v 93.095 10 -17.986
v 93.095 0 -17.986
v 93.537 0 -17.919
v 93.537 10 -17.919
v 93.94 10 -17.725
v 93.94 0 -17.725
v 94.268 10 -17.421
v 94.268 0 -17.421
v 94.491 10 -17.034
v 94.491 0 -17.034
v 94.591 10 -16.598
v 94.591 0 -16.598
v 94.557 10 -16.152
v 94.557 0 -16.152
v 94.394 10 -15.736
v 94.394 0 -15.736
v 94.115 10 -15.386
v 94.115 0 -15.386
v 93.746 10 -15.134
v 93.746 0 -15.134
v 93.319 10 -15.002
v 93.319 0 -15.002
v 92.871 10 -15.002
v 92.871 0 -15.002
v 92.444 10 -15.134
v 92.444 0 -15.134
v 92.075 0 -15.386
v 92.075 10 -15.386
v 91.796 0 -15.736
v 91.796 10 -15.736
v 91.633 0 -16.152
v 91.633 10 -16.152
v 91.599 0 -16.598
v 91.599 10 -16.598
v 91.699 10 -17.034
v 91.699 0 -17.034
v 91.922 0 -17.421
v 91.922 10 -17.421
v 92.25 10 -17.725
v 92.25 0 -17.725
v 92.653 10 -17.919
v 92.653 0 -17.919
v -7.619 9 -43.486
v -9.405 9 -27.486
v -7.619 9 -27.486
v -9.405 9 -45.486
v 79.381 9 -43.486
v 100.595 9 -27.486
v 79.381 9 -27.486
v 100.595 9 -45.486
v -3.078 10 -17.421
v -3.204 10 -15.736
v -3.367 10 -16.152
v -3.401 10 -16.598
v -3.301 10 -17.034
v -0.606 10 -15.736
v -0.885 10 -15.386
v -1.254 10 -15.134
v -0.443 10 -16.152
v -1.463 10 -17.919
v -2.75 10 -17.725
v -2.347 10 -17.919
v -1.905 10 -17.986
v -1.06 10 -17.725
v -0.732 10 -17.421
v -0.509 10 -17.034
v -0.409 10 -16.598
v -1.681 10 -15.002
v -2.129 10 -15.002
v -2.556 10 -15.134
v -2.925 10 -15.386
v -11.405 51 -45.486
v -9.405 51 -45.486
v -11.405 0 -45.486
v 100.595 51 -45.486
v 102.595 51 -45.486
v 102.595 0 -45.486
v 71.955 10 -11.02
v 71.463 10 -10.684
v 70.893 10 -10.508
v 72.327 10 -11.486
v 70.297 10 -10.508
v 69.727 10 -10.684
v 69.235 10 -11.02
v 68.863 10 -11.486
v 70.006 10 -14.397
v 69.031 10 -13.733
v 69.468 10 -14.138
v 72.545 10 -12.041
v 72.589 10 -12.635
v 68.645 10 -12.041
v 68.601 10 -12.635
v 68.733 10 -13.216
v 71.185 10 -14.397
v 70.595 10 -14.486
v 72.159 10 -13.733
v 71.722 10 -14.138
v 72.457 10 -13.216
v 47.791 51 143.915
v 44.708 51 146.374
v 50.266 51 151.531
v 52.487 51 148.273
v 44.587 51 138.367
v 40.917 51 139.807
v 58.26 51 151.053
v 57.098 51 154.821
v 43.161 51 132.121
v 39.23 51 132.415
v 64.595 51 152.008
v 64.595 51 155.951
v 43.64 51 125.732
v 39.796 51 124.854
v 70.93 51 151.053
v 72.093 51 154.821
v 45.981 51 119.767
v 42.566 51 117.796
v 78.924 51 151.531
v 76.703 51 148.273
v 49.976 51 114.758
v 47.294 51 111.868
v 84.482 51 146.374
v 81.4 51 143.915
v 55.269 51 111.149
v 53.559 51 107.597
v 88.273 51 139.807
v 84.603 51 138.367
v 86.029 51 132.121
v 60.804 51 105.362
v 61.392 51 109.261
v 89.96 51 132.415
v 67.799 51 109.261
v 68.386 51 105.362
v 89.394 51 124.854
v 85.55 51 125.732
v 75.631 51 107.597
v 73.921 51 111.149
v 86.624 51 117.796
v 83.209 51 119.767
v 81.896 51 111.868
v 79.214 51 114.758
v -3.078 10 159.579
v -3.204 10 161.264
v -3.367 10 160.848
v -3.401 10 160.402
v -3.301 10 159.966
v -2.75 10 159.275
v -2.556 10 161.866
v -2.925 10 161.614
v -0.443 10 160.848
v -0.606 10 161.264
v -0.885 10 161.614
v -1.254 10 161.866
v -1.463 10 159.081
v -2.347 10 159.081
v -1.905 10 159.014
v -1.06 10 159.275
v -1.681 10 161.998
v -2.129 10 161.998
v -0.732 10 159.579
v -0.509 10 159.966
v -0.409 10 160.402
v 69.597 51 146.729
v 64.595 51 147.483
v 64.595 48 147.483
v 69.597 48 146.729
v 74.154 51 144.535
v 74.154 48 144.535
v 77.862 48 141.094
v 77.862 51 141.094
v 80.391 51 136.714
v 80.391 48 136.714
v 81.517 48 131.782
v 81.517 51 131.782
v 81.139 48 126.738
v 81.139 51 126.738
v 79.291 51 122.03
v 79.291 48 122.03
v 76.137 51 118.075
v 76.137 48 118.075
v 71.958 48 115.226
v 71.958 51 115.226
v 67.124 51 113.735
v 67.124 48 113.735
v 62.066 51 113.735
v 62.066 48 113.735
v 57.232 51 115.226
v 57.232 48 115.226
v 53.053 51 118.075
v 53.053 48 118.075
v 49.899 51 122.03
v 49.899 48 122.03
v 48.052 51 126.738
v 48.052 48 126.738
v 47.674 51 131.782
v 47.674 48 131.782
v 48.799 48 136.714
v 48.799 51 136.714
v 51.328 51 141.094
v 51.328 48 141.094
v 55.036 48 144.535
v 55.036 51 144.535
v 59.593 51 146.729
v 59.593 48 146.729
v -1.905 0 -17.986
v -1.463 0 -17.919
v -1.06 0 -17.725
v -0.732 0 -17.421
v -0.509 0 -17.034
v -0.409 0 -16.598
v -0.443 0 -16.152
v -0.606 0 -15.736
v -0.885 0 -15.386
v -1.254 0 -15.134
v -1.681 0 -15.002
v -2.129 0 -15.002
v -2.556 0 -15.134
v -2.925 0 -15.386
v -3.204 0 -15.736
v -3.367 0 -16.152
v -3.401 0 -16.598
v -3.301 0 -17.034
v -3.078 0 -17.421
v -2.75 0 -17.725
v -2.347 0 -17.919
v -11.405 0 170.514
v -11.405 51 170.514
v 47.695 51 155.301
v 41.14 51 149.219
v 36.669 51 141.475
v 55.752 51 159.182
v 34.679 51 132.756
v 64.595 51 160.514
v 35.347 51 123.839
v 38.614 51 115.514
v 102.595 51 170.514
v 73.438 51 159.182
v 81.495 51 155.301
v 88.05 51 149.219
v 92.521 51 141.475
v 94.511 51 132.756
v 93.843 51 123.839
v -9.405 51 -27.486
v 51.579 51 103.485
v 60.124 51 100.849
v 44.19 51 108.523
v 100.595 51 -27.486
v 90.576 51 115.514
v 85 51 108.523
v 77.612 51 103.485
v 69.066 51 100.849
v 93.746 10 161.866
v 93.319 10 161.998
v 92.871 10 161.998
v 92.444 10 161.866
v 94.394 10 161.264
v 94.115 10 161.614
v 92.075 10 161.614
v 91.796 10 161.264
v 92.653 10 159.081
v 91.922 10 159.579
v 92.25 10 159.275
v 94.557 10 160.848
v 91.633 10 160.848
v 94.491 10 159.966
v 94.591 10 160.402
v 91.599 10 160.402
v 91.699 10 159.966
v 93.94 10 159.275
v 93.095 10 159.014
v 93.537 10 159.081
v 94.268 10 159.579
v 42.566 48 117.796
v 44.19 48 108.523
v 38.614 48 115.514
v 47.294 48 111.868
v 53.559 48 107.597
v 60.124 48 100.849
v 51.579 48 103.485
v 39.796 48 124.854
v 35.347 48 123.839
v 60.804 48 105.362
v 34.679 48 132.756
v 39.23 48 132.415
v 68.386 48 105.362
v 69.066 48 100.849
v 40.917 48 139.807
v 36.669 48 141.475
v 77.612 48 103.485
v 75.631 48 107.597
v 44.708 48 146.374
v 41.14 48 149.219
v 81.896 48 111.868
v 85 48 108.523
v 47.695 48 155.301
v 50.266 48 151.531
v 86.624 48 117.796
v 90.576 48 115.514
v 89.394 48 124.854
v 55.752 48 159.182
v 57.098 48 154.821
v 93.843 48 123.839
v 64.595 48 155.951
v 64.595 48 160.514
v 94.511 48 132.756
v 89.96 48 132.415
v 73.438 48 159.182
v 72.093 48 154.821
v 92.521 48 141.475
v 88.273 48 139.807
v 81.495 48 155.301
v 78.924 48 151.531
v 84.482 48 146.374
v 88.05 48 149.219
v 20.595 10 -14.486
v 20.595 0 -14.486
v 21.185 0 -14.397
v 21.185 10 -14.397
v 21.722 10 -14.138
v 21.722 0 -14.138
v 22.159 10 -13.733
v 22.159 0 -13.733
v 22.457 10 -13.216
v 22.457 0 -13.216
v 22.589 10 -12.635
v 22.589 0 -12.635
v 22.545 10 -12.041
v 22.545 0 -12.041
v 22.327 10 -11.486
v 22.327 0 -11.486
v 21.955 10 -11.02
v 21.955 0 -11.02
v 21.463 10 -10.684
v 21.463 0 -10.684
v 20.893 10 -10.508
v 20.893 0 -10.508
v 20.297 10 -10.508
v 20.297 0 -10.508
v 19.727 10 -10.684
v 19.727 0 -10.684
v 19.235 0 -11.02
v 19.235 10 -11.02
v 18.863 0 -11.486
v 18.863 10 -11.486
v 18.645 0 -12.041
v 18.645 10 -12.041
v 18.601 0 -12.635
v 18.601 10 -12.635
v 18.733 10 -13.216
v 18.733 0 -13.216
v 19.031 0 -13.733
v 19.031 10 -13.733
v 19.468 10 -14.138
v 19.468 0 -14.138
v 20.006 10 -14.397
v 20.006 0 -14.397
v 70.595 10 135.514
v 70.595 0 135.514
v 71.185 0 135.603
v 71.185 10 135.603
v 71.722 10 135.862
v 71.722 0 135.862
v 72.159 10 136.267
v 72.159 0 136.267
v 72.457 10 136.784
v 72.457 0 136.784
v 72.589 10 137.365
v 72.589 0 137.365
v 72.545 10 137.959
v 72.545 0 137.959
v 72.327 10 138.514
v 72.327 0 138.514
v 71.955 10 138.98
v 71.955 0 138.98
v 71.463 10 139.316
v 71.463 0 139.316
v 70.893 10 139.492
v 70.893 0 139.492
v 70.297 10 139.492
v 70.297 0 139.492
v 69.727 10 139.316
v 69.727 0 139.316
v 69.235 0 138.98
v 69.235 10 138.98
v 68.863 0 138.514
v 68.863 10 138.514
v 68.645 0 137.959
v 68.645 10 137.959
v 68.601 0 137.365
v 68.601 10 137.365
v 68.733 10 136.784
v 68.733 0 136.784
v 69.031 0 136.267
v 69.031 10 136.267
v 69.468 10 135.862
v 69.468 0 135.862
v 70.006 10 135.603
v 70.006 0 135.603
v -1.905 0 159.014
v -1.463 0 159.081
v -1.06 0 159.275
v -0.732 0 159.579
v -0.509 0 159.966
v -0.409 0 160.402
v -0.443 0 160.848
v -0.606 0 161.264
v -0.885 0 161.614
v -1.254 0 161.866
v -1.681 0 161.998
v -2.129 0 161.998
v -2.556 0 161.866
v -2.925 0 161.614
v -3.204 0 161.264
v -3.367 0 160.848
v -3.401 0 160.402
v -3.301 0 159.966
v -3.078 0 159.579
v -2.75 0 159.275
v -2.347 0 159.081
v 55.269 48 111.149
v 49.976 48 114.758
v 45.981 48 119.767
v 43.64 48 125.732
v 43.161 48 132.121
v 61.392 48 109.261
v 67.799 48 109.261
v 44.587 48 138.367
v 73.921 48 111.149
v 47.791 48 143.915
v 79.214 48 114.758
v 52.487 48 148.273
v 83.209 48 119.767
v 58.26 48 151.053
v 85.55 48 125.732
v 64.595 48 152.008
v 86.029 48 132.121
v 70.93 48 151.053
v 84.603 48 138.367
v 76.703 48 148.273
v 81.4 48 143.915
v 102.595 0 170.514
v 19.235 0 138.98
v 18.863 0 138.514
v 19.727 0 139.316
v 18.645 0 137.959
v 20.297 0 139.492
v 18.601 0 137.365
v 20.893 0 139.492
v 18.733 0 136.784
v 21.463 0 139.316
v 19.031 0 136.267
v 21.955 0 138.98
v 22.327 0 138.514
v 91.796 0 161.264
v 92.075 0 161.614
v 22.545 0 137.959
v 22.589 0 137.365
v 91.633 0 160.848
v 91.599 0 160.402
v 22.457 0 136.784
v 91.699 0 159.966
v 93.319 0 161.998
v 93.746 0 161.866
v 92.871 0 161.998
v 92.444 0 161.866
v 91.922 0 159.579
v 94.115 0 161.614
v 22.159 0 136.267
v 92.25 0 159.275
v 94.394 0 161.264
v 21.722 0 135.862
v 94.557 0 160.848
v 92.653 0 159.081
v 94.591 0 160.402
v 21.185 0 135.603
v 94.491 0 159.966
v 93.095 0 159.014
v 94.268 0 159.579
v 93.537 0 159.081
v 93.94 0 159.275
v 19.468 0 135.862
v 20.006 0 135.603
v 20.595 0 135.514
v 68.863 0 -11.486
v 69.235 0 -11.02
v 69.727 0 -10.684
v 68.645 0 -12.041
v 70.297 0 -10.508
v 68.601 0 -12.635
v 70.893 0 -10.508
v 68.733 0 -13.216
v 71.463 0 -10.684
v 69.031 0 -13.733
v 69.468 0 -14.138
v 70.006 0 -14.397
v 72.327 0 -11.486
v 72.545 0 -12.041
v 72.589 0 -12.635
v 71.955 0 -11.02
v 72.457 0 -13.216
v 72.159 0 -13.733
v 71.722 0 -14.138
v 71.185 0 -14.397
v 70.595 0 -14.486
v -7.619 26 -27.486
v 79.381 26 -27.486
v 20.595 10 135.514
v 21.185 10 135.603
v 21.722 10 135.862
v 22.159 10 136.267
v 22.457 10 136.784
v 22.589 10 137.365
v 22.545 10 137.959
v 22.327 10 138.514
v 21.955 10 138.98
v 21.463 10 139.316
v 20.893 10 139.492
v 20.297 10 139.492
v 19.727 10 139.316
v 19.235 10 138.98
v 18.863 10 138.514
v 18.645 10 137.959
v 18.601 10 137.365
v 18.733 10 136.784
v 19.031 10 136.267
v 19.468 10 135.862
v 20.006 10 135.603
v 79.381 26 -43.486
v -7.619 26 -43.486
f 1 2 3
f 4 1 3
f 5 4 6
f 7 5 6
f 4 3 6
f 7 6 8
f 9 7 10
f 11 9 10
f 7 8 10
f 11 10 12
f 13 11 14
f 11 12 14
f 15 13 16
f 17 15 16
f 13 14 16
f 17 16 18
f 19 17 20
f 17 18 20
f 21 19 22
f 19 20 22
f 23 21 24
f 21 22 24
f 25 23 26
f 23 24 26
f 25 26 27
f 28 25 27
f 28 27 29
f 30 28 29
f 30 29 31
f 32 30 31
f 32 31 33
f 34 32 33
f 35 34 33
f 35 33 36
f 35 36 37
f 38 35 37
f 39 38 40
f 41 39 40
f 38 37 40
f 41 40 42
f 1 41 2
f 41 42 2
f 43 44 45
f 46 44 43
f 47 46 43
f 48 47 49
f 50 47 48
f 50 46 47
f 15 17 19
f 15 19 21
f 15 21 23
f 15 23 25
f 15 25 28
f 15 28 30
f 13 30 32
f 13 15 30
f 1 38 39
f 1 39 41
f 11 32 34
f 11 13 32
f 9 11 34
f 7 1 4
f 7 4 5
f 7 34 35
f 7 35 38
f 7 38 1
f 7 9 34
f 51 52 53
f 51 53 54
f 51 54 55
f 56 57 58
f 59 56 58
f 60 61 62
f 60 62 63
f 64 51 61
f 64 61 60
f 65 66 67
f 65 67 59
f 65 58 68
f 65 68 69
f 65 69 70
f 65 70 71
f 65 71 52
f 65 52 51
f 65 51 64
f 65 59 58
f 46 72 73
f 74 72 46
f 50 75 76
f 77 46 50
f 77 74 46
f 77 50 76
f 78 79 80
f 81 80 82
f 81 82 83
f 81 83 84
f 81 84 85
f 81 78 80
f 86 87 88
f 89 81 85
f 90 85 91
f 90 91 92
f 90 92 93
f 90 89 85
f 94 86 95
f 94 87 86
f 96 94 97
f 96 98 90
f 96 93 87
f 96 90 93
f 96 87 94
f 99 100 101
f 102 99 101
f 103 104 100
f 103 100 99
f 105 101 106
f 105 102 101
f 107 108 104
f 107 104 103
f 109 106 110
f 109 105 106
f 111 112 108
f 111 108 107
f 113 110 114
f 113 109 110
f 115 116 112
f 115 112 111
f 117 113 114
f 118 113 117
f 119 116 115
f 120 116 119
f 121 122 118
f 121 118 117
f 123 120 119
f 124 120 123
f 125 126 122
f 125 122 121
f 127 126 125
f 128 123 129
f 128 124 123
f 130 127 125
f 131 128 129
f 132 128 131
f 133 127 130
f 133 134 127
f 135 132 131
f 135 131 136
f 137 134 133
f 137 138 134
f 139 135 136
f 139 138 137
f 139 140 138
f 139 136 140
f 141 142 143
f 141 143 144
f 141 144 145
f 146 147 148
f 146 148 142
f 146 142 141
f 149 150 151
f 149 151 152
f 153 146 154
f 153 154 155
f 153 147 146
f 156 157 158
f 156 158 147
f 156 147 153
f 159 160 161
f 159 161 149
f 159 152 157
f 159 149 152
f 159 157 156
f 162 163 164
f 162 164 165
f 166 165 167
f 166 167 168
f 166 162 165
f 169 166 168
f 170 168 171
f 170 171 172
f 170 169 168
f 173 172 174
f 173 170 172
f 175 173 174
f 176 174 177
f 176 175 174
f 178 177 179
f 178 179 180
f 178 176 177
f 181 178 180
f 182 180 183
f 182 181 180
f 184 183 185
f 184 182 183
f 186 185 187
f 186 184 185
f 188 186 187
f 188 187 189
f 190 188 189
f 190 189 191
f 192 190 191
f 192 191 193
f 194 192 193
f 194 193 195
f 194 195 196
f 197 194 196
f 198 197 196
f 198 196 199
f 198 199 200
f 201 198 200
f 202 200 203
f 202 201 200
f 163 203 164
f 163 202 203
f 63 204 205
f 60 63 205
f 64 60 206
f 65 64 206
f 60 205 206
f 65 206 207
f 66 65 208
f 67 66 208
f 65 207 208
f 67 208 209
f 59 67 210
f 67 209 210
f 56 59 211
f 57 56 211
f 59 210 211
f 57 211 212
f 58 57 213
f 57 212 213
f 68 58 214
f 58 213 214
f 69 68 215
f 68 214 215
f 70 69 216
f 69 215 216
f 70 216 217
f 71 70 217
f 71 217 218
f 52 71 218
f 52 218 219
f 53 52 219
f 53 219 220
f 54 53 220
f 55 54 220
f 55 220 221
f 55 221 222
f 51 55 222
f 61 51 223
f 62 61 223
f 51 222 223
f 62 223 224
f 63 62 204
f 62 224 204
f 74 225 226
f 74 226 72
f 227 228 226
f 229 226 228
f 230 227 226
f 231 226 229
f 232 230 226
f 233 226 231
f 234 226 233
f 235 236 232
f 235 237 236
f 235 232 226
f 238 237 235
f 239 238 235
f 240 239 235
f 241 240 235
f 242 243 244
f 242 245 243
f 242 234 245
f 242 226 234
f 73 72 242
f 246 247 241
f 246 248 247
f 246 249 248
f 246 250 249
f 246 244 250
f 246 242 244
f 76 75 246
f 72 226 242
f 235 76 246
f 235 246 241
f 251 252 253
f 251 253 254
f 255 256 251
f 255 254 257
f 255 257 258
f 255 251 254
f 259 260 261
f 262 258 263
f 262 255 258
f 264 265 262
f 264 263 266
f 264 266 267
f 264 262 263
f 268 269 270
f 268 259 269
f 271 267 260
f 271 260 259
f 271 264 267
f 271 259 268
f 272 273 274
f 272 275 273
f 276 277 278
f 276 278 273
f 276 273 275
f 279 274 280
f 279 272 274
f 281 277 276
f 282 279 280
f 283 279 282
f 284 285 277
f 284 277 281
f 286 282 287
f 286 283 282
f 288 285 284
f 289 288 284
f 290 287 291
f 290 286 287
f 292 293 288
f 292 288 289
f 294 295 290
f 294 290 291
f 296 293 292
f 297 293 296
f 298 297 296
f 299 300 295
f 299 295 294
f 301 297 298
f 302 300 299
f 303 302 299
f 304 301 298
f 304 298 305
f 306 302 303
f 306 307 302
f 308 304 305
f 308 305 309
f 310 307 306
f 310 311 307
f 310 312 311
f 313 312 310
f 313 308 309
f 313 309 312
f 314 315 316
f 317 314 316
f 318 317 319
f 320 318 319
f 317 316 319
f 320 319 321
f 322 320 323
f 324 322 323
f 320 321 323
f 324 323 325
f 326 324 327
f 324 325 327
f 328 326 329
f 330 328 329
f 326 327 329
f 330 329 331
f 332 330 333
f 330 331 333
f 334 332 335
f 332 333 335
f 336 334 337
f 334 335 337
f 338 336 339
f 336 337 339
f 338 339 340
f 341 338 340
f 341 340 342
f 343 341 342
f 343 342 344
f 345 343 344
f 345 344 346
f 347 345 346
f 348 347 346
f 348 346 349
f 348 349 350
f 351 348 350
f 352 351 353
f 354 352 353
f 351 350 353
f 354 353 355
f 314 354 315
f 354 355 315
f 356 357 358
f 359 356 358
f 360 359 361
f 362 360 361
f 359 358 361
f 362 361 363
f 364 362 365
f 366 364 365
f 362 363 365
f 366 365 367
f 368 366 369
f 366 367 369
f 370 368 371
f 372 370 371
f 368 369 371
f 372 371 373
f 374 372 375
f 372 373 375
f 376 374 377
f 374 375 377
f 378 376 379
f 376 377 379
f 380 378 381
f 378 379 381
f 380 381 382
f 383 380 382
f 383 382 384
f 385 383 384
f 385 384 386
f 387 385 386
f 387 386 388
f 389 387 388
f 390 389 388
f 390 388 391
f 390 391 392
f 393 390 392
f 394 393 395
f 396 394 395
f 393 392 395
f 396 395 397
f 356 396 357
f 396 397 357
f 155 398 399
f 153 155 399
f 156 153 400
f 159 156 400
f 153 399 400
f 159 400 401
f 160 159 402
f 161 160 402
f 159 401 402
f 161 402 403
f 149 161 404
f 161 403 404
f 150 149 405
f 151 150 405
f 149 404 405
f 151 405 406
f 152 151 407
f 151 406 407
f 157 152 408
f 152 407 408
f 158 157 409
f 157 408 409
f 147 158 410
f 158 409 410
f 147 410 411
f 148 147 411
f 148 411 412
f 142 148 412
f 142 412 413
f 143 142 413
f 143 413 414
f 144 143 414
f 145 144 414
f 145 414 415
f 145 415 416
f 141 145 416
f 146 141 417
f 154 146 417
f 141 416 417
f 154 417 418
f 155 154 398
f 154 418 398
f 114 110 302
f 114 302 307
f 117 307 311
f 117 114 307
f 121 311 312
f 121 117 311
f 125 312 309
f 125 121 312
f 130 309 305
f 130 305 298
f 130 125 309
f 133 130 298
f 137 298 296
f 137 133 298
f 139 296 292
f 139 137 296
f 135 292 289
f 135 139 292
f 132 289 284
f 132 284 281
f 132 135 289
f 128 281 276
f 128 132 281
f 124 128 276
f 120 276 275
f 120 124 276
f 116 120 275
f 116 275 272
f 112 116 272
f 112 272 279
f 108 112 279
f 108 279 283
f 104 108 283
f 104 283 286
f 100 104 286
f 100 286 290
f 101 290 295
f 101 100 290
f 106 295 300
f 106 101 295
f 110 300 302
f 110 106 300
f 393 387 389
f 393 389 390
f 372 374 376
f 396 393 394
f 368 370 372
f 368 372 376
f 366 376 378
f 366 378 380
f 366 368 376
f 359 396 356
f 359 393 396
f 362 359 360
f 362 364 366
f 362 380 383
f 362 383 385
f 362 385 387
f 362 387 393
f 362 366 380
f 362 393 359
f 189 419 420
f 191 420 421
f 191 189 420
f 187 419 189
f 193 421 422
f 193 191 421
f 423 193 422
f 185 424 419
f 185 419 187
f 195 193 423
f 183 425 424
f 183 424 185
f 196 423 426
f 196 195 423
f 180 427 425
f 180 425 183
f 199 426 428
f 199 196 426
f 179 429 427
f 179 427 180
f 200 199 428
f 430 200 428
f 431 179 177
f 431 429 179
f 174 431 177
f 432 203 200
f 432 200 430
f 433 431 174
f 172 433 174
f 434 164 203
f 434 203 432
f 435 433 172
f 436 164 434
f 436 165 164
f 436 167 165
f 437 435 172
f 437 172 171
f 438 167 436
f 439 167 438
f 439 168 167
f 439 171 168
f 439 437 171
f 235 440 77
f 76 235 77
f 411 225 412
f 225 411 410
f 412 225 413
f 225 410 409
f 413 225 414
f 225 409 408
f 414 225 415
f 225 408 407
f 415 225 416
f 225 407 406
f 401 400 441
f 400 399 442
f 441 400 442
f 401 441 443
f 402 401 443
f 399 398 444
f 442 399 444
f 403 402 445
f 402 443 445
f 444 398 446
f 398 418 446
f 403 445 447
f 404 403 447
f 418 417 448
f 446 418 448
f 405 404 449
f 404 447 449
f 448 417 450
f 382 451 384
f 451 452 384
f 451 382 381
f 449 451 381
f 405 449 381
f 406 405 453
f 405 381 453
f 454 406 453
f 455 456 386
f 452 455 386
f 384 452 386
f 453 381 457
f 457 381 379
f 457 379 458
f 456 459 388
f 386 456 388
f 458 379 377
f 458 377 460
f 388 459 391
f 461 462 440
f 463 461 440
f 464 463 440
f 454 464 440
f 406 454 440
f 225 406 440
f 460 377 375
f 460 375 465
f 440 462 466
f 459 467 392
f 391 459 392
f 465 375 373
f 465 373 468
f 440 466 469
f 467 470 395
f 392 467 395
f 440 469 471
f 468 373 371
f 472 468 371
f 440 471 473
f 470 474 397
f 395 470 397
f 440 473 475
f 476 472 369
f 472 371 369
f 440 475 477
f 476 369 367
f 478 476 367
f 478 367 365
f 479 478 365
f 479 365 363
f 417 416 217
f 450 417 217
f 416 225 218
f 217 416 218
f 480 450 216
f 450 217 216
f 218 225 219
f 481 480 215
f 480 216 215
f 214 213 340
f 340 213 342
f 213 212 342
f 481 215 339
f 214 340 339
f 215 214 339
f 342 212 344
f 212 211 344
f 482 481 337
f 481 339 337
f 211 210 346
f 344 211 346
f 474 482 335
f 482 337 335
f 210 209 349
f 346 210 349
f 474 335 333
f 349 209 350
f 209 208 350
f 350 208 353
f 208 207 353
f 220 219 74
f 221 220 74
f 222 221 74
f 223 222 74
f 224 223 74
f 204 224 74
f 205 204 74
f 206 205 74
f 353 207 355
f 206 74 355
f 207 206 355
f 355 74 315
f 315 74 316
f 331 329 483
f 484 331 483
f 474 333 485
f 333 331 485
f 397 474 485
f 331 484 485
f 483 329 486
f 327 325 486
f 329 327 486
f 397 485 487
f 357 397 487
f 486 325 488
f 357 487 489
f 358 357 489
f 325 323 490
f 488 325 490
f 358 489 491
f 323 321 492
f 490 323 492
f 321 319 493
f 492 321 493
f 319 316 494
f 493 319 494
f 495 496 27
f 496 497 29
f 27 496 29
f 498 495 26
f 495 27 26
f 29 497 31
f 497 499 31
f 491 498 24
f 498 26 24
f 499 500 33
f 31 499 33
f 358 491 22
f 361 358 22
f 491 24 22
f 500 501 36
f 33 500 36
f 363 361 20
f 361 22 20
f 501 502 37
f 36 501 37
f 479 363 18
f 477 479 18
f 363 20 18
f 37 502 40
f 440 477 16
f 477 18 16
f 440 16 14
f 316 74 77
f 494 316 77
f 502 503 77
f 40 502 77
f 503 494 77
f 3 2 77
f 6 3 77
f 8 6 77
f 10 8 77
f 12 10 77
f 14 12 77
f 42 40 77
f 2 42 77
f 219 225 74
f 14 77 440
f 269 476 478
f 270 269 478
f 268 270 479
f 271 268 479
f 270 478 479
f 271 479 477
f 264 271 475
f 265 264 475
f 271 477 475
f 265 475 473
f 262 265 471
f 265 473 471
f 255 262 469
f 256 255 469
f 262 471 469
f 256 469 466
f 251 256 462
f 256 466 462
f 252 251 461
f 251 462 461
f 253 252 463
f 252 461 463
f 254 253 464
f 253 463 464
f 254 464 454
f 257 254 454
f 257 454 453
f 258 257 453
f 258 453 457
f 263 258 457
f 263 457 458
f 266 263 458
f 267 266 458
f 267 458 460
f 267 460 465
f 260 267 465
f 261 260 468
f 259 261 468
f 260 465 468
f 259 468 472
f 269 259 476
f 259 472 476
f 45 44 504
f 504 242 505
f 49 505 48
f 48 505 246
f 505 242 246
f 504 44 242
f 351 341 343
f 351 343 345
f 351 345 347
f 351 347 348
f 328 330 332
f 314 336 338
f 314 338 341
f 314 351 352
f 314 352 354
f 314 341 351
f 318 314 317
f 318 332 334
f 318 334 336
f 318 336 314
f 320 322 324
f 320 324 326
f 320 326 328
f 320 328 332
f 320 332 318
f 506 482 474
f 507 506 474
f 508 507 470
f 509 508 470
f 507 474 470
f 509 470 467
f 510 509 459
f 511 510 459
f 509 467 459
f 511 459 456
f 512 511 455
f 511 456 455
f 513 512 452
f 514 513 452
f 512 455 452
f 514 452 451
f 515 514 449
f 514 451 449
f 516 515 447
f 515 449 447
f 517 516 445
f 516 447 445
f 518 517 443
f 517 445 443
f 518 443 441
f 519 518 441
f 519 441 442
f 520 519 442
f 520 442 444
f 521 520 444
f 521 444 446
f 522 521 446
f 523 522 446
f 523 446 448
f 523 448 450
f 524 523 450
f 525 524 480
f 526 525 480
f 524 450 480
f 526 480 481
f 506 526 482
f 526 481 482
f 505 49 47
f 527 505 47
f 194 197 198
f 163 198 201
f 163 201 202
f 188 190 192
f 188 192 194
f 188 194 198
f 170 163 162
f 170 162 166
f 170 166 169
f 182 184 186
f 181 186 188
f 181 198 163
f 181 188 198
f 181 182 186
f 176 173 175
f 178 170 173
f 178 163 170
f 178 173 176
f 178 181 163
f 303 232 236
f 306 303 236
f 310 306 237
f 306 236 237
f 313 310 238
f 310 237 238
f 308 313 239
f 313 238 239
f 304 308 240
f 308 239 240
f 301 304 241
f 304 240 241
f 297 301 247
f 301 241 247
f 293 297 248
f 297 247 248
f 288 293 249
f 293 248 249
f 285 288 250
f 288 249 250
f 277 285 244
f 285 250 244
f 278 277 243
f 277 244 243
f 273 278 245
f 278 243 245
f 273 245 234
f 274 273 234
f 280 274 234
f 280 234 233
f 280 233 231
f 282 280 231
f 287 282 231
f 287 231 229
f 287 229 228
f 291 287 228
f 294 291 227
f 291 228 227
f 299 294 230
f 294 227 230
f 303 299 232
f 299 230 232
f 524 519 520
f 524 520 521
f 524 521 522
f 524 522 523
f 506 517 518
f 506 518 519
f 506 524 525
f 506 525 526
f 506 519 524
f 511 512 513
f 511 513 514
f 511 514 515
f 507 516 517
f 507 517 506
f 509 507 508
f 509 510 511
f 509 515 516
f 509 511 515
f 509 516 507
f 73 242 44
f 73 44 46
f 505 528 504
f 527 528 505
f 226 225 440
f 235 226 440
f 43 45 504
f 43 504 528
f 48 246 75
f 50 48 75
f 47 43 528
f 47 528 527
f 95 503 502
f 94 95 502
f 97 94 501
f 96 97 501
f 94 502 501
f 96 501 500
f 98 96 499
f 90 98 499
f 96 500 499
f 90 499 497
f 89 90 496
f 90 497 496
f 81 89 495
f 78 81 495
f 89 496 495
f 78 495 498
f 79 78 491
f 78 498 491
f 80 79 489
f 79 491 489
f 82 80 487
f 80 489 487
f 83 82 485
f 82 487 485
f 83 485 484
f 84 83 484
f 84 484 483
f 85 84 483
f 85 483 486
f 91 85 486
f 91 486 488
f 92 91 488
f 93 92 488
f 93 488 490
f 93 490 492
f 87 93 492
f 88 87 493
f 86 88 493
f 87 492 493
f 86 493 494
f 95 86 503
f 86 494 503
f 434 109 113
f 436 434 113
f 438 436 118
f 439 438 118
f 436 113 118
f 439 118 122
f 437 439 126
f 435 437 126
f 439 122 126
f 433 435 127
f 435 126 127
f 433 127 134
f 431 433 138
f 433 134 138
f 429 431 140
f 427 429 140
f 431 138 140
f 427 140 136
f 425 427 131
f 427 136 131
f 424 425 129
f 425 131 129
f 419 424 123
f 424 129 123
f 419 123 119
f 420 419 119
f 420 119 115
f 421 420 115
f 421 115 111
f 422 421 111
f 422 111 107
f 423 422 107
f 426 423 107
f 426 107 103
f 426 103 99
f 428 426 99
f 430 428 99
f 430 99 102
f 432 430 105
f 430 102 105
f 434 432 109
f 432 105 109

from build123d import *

# Parameters (mm, degrees)
SKETCH_2_W          = 114
SKETCH_2_H          = 216
EXTRUDE_2_DEPTH     = 51
SKETCH_3_R          = 1.5
SKETCH_3_R_2        = 2
CUT_EXTRUDE_1_DEPTH = 10
SKETCH_4_W          = 110
SKETCH_4_H          = 18
CUT_EXTRUDE_2_DEPTH = 42
SKETCH_5_W          = 87
SKETCH_5_H          = 16
EXTRUDE_3_DEPTH     = 17
SKETCH_6_R          = 30
SKETCH_6_R_2        = 25.436388115
CUT_EXTRUDE_4_DEPTH = 3
SKETCH_7_R          = 21.493717547
SKETCH_7_R_2        = 16.968980291
CUT_EXTRUDE_5_DEPTH = 3


with BuildPart() as part:
    # Эскиз2 → Бобышка-Вытянуть2 (new body)
    with BuildSketch(Plane(origin=(0, 0, 0), x_dir=(1, 0, 0), z_dir=(0, 1, 0))):
        with Locations((45.595035846, -62.514319432)):
            Rectangle(SKETCH_2_W, SKETCH_2_H)
    extrude(amount=EXTRUDE_2_DEPTH)

    # Эскиз3 → Вырез-Вытянуть1 (cut)
    with BuildSketch(Plane.XZ):
        with Locations(Location((-1.904964154, 160.514319432, 0), (0, 0, 270))):
            Circle(SKETCH_3_R)
        with Locations(Location((93.095035846, 160.514319432, 0), (0, 0, 270))):
            Circle(SKETCH_3_R)
        with Locations(Location((-1.904964154, -16.485680568, 0), (0, 0, 270))):
            Circle(SKETCH_3_R)
        with Locations(Location((93.095035846, -16.485680568, 0), (0, 0, 270))):
            Circle(SKETCH_3_R)
        with Locations(Location((20.595035846, 137.514319432, 0), (0, 0, 270))):
            Circle(SKETCH_3_R_2)
        with Locations(Location((70.595035846, 137.514319432, 0), (0, 0, 270))):
            Circle(SKETCH_3_R_2)
        with Locations(Location((20.595035846, -12.485680568, 0), (0, 0, 270))):
            Circle(SKETCH_3_R_2)
        with Locations(Location((70.595035846, -12.485680568, 0), (0, 0, 270))):
            Circle(SKETCH_3_R_2)
    extrude(amount=-CUT_EXTRUDE_1_DEPTH, mode=Mode.SUBTRACT)

    # Эскиз4 → Вырез-Вытянуть2 (cut)
    with BuildSketch(Plane(origin=(0, 51, 0), x_dir=(1, 0, 0), z_dir=(0, 1, 0))):
        with Locations((45.595035846, 36.485680568)):
            Rectangle(SKETCH_4_W, SKETCH_4_H)
    extrude(amount=-CUT_EXTRUDE_2_DEPTH, mode=Mode.SUBTRACT)

    # Эскиз5 → Бобышка-Вытянуть3 (add)
    with BuildSketch(Plane(origin=(0, 9, 0), x_dir=(1, 0, 0), z_dir=(0, 1, 0))):
        with Locations((35.880674643, 35.485680568)):
            Rectangle(SKETCH_5_W, SKETCH_5_H)
    extrude(amount=EXTRUDE_3_DEPTH)

    # Эскиз6 → Вырез-Вытянуть4 (cut)
    with BuildSketch(Plane(origin=(0, 51, 0), x_dir=(1, 0, 0), z_dir=(0, 1, 0))):
        with Locations(Location((64.595035846, -130.514319432, 0), (0, 0, 270))):
            Circle(SKETCH_6_R)
        with Locations(Location((64.595035846, -130.514319432, 0), (0, 0, 270))):
            Circle(SKETCH_6_R_2, mode=Mode.SUBTRACT)
    extrude(amount=-CUT_EXTRUDE_4_DEPTH, mode=Mode.SUBTRACT)

    # Эскиз7 → Вырез-Вытянуть5 (cut)
    with BuildSketch(Plane(origin=(0, 51, 0), x_dir=(1, 0, 0), z_dir=(0, 1, 0))):
        with Locations(Location((64.595035846, -130.514319432, 0), (0, 0, 270))):
            Circle(SKETCH_7_R)
        with Locations(Location((64.595035846, -130.514319432, 0), (0, 0, 270))):
            Circle(SKETCH_7_R_2, mode=Mode.SUBTRACT)
    extrude(amount=-CUT_EXTRUDE_5_DEPTH, mode=Mode.SUBTRACT)


solid = part.part
